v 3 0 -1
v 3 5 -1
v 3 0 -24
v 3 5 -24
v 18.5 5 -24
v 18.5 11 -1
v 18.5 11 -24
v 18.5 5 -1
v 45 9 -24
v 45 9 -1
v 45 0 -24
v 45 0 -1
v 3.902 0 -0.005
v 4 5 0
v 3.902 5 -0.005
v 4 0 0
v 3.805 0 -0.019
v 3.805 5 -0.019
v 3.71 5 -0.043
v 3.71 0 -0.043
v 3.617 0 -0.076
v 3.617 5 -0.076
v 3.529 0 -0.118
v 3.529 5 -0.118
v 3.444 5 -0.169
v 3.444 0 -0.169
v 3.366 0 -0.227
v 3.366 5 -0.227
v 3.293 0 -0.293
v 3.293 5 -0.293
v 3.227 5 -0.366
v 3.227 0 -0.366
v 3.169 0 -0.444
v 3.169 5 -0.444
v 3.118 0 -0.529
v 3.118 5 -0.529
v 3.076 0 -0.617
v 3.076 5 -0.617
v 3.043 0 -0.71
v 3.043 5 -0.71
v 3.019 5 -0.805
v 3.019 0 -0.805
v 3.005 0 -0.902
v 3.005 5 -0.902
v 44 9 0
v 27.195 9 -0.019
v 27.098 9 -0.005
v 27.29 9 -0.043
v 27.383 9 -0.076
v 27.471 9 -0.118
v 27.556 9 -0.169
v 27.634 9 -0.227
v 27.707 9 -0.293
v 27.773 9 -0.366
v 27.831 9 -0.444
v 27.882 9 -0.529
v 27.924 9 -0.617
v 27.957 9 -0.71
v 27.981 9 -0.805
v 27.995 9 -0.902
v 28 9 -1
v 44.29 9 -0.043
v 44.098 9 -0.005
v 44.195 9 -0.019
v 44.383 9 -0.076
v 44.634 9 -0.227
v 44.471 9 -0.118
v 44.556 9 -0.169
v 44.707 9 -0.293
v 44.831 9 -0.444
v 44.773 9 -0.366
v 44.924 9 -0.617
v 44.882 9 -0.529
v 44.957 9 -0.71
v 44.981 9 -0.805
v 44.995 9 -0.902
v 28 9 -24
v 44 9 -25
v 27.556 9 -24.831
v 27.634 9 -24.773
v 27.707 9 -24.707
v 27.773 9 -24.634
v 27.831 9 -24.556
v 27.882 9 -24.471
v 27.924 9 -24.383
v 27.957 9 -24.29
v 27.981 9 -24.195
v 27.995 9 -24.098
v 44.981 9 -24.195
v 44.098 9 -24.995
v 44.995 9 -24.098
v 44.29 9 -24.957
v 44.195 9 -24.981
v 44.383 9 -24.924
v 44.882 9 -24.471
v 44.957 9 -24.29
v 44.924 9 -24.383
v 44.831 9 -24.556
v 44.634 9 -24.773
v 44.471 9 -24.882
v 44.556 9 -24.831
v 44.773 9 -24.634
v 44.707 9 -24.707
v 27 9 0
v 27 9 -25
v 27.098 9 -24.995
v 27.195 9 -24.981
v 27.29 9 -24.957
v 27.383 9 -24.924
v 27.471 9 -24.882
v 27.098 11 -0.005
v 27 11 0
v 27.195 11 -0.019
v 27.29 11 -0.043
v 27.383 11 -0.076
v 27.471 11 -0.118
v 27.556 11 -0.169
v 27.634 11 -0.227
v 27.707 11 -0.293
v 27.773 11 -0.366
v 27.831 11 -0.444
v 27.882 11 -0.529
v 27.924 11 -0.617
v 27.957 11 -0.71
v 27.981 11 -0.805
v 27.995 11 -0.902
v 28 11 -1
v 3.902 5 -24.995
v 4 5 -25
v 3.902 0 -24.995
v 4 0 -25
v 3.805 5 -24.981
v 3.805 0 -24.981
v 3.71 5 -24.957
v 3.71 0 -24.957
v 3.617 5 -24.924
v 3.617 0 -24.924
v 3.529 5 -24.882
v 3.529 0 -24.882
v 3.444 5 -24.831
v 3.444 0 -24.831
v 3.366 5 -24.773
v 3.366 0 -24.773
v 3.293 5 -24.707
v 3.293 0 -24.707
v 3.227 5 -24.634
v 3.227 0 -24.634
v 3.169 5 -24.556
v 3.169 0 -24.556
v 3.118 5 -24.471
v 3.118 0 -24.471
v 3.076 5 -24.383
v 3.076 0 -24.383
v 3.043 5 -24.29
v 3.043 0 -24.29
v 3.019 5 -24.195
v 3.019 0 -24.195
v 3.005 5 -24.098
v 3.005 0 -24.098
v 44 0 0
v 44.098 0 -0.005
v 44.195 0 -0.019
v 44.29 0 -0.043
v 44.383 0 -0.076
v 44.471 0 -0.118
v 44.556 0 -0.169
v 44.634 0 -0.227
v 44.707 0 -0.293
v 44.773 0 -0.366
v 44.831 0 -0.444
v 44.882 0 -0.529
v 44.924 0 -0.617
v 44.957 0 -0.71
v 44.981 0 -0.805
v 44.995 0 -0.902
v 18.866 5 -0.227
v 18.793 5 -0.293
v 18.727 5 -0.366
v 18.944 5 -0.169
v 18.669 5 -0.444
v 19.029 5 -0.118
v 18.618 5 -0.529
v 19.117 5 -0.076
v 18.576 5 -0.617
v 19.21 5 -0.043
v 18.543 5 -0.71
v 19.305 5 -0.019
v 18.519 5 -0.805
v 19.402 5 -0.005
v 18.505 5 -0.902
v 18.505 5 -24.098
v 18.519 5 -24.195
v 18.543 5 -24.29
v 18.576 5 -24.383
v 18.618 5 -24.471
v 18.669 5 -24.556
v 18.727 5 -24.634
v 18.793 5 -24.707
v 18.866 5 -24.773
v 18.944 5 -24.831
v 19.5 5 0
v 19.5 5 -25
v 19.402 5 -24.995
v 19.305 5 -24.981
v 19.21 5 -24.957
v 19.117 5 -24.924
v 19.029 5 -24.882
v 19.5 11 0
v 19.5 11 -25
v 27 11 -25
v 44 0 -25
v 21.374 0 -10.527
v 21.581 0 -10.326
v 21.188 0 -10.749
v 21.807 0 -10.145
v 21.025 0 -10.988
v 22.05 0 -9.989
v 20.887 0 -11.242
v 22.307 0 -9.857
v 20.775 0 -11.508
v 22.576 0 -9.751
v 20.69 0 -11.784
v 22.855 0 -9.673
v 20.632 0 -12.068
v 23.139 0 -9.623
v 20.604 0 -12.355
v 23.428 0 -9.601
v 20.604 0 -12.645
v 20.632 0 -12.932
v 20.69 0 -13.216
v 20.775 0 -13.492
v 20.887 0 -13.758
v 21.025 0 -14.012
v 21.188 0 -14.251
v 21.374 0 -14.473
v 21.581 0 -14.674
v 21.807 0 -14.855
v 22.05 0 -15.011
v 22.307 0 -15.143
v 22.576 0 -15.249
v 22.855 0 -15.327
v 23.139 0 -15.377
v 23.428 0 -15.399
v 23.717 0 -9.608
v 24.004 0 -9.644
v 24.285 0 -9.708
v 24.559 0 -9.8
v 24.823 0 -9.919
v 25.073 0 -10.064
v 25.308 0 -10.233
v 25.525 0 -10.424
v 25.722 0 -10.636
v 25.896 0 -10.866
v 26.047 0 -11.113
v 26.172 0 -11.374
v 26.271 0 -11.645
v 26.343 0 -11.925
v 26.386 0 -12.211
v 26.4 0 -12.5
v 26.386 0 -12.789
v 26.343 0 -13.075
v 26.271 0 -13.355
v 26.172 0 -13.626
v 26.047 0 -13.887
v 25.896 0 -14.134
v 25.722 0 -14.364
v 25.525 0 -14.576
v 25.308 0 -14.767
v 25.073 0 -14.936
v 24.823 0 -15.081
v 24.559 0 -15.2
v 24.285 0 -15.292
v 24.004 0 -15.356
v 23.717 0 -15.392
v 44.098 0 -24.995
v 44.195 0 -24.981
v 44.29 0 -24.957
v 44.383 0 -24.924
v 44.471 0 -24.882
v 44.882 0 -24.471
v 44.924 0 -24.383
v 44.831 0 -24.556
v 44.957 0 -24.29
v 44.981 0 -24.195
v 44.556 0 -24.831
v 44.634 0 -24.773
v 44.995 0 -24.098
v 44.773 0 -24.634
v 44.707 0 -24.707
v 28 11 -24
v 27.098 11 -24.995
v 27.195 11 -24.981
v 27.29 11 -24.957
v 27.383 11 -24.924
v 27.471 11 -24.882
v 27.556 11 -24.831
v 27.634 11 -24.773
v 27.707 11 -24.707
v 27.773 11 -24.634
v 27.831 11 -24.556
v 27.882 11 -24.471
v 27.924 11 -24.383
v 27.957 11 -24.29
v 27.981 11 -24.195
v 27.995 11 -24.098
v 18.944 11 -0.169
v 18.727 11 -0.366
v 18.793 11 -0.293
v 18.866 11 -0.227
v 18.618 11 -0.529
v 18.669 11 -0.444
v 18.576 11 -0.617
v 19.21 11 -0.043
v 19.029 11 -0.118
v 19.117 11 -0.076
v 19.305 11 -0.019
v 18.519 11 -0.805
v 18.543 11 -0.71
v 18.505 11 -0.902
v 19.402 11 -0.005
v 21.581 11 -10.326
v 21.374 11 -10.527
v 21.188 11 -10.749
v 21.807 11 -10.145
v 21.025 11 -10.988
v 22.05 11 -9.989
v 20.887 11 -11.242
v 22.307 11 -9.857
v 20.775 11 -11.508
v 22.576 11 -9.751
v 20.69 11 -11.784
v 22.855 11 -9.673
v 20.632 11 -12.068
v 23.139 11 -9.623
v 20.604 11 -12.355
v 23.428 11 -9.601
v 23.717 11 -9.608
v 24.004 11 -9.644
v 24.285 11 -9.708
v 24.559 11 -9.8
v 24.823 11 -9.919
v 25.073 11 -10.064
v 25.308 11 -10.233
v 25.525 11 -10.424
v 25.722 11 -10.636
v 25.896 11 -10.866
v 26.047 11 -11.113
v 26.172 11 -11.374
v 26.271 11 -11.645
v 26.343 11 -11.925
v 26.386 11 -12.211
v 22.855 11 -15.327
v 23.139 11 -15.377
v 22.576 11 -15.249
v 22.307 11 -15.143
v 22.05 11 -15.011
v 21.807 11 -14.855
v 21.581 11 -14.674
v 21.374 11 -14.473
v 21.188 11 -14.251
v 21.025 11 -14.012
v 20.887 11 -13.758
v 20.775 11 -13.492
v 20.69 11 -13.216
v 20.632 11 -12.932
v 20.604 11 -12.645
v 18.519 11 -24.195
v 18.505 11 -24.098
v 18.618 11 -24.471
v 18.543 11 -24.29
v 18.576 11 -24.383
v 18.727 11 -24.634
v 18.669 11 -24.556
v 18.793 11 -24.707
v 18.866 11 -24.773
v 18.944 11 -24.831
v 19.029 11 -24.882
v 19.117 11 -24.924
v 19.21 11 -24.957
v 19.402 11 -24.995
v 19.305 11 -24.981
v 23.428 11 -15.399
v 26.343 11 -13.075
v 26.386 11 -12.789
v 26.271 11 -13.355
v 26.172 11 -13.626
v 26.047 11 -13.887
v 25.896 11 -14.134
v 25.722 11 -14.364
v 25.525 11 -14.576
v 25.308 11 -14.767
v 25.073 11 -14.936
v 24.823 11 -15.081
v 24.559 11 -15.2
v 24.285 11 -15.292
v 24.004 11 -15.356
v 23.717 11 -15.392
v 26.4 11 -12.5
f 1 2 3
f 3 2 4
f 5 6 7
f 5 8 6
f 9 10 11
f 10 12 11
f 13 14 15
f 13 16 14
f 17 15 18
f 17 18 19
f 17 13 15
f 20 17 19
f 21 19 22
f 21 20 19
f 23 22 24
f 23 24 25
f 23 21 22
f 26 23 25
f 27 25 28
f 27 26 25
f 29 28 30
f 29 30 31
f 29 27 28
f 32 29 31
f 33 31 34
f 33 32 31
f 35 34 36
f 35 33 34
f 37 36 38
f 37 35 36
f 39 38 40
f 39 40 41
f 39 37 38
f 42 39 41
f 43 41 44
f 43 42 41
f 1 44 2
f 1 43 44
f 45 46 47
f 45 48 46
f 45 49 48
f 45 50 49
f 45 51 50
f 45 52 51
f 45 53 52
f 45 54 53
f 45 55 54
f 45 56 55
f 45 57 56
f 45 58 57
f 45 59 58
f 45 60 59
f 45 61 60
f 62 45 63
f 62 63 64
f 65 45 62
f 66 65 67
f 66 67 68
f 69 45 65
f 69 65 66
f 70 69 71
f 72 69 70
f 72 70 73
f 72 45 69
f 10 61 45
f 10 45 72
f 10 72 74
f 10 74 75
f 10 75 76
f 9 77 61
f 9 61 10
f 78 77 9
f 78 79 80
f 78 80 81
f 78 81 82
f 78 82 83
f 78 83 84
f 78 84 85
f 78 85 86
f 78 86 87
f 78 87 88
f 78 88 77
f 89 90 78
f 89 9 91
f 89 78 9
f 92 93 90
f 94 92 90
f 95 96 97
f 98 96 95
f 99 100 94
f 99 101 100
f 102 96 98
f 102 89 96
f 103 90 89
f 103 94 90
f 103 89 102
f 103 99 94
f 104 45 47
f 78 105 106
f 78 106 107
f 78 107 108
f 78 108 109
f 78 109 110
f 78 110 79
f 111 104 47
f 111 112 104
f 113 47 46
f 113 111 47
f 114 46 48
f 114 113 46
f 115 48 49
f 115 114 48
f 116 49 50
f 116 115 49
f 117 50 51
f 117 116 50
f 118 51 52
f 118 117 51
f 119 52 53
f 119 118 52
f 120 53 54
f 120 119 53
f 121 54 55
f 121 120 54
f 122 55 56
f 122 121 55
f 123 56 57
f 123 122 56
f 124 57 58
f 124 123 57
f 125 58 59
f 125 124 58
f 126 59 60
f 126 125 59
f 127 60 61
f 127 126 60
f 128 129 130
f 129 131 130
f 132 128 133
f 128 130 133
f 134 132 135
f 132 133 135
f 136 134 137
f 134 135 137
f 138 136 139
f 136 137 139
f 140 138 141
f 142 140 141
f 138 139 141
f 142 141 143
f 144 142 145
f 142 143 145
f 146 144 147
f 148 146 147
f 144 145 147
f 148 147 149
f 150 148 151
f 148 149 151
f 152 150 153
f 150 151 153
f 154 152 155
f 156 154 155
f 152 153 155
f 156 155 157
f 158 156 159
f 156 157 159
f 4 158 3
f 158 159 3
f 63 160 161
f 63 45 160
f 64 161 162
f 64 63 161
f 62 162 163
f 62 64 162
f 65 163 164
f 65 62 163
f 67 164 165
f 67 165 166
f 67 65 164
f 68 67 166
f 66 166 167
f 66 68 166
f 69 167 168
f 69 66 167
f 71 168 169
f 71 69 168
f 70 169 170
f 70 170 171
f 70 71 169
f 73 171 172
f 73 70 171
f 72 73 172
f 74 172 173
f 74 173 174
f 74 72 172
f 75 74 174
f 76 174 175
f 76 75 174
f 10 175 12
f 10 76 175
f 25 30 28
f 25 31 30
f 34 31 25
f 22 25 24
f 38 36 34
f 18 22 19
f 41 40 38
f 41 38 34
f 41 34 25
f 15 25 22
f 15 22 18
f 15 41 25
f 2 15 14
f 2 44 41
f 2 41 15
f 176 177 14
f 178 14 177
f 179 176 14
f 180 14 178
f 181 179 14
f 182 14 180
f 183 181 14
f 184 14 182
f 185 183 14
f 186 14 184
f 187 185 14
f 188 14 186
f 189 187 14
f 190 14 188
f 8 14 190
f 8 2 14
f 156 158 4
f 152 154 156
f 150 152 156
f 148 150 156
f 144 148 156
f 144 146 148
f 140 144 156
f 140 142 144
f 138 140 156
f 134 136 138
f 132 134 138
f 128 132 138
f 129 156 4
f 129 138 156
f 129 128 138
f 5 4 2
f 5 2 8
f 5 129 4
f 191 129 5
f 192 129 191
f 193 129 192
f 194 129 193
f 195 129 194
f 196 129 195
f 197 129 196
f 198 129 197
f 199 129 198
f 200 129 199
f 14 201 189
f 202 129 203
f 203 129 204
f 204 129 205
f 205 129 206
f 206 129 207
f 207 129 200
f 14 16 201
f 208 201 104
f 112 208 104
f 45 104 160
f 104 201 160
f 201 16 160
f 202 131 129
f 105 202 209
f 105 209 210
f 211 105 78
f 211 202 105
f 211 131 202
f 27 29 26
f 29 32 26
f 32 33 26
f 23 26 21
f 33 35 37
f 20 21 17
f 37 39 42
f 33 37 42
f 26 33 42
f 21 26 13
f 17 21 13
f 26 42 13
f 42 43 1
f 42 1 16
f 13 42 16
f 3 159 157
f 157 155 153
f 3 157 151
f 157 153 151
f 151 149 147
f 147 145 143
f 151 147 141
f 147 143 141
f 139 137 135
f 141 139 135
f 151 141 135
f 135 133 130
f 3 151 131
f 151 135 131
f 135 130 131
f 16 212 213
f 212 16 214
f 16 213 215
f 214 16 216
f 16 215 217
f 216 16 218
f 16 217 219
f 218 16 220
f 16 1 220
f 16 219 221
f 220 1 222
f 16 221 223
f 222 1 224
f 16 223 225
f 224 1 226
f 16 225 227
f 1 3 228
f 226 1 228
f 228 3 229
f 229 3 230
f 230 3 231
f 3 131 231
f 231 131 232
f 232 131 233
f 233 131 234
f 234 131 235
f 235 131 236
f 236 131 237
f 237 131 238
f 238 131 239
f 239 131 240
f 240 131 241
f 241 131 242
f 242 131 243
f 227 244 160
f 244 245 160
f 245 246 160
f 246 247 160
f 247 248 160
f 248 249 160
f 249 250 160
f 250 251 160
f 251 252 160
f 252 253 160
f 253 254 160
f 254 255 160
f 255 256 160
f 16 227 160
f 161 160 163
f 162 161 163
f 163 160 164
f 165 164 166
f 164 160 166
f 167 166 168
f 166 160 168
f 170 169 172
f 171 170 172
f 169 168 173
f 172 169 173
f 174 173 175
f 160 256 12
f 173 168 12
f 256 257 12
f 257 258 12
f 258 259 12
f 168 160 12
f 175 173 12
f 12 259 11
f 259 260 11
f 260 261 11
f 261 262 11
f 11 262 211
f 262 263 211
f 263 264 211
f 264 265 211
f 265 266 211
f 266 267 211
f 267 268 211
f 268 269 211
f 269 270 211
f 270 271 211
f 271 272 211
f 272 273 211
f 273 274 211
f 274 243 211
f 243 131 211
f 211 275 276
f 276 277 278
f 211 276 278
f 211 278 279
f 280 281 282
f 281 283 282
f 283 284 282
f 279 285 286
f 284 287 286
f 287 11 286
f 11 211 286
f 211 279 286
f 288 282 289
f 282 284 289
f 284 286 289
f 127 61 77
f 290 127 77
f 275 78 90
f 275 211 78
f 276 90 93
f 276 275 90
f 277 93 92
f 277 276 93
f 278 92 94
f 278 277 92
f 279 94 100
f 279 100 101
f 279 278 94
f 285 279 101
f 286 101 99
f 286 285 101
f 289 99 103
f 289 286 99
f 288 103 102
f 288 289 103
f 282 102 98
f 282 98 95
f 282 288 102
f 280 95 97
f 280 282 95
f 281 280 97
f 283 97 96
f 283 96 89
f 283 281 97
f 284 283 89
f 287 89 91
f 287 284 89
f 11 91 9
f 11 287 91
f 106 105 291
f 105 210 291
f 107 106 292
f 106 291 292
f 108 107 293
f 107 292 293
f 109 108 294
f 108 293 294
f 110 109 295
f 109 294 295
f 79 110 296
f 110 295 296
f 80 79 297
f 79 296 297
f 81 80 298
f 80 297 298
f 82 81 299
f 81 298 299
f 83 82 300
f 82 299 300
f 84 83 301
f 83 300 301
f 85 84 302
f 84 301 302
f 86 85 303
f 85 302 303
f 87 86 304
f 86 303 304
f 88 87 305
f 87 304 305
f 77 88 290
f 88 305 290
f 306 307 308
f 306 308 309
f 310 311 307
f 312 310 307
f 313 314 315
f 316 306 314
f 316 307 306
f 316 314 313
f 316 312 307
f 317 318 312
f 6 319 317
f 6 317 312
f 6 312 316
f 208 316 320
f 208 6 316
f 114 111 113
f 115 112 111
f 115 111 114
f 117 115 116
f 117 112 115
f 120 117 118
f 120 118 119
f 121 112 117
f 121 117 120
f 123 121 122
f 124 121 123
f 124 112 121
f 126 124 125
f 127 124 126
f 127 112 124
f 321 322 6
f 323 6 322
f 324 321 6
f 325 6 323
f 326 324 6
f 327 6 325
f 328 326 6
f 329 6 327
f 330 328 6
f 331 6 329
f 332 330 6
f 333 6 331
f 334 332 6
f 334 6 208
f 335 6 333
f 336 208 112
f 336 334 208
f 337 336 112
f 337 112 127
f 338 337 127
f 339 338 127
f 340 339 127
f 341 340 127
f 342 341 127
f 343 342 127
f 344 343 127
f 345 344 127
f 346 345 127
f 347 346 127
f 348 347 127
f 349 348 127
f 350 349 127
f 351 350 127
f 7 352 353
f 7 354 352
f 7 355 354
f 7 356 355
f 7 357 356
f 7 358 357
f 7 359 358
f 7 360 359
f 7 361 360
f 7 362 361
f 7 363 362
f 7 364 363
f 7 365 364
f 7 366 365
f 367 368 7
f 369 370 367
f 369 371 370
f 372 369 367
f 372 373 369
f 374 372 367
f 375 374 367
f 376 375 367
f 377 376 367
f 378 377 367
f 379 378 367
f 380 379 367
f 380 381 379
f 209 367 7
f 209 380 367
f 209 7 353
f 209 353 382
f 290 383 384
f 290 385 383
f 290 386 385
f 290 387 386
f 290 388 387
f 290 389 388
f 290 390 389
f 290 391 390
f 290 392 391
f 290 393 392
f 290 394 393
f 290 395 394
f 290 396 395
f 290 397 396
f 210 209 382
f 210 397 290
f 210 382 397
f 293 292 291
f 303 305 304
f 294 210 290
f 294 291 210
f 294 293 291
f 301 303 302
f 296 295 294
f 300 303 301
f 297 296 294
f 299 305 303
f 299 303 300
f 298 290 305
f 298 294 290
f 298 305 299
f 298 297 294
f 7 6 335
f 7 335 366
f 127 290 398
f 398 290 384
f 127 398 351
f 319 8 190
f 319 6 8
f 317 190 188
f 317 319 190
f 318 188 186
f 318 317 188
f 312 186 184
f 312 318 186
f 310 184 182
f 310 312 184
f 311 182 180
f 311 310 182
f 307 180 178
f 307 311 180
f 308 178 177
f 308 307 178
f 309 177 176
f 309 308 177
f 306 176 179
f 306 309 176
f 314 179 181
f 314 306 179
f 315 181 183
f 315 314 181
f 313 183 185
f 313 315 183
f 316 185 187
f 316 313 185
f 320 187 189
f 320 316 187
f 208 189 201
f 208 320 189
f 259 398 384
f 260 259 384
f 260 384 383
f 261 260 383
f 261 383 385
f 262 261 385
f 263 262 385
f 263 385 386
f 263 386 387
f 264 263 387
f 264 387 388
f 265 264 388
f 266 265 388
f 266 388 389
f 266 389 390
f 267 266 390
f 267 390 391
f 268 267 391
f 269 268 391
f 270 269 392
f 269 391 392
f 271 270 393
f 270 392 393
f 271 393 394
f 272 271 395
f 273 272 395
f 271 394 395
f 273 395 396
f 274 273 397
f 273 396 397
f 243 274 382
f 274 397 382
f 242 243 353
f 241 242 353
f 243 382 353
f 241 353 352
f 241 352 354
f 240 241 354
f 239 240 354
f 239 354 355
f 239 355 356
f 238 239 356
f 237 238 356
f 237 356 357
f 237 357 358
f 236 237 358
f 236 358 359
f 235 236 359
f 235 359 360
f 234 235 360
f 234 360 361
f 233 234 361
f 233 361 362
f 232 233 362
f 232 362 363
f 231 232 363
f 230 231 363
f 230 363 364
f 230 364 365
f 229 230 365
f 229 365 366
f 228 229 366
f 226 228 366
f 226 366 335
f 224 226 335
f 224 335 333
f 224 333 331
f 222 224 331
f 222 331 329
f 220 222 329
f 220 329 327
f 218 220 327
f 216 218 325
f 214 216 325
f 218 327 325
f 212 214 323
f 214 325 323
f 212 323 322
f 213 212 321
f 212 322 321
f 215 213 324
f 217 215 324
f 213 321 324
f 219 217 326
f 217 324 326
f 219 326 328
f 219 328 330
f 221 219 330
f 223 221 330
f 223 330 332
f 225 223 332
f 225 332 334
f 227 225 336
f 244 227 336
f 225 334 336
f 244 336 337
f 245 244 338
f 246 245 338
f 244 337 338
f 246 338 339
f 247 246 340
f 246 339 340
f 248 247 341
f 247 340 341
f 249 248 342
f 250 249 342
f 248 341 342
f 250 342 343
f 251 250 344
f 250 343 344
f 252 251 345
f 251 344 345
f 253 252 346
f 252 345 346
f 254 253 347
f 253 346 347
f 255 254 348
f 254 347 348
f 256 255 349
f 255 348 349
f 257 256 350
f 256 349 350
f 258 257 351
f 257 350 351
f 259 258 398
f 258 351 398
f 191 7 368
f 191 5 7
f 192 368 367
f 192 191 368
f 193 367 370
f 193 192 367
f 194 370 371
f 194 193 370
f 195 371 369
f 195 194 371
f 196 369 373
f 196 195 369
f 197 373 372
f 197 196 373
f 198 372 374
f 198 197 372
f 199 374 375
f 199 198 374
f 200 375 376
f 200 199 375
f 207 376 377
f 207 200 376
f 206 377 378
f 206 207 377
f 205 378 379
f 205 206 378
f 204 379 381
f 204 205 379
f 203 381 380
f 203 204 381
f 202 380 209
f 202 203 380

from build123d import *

# Parameters (mm, degrees)
SKETCH1_W            = 45
SKETCH1_H            = 25
BOSS_EXTRUDE1_DEPTH  = 5
SKETCH5_W            = 26.5
SKETCH5_H            = 25
BOSS_EXTRUDE3_DEPTH  = 4
SKETCH11_W           = 9.5
SKETCH11_H           = 25
BOSS_EXTRUDE5_DEPTH  = 2
SKETCH12_W           = 3
SKETCH12_H           = 25
CUT_EXTRUDE2_DEPTH   = 52.826634079
M5_CLEARANCE_HOLE1_D = 5.8
FILLET2_R            = 1


with BuildPart() as part:
    # Sketch1 → Boss-Extrude1 (new body)
    with BuildSketch(Plane(origin=(0, 0, 0), x_dir=(1, 0, 0), z_dir=(0, 1, 0))):
        with Locations((22.5, 12.5)):
            Rectangle(SKETCH1_W, SKETCH1_H)
    extrude(amount=BOSS_EXTRUDE1_DEPTH)

    # Sketch5 → Boss-Extrude3 (add)
    with BuildSketch(Plane(origin=(0, 5, 0), x_dir=(1, 0, 0), z_dir=(0, 1, 0))):
        with Locations((31.75, 12.5)):
            Rectangle(SKETCH5_W, SKETCH5_H)
    extrude(amount=BOSS_EXTRUDE3_DEPTH)

    # Sketch11 → Boss-Extrude5 (add)
    with BuildSketch(Plane(origin=(0, 9, 0), x_dir=(1, 0, 0), z_dir=(0, 1, 0))):
        with Locations((23.25, 12.5)):
            Rectangle(SKETCH11_W, SKETCH11_H)
    extrude(amount=BOSS_EXTRUDE5_DEPTH)

    # Sketch12 → Cut-Extrude2 (cut, through all)
    with BuildSketch(Plane(origin=(0, 5, 0), x_dir=(1, 0, 0), z_dir=(0, 1, 0))):
        with Locations((1.5, 12.5)):
            Rectangle(SKETCH12_W, SKETCH12_H)
    extrude(amount=-CUT_EXTRUDE2_DEPTH, mode=Mode.SUBTRACT)

    # M5 Clearance Hole1 (through all)
    with Locations(Plane(origin=(0, 0, 0), x_dir=(-1, 0, 0), z_dir=(0, -1, 0))):
        with Locations((-23.5, 12.5)):
            Hole(M5_CLEARANCE_HOLE1_D / 2)

    # Fillet2
    fillet2_edges = [part.edges().sort_by_distance(p)[0] for p in [
        (18.5, 8, -25),
        (18.5, 8, 0),
        (28, 10, 0),
        (28, 10, -25),
        (3, 2.5, -25),
        (3, 2.5, 0),
        (45, 4.5, -25),
        (45, 4.5, 0),
    ]]
    fillet(fillet2_edges, radius=FILLET2_R)


solid = part.part
